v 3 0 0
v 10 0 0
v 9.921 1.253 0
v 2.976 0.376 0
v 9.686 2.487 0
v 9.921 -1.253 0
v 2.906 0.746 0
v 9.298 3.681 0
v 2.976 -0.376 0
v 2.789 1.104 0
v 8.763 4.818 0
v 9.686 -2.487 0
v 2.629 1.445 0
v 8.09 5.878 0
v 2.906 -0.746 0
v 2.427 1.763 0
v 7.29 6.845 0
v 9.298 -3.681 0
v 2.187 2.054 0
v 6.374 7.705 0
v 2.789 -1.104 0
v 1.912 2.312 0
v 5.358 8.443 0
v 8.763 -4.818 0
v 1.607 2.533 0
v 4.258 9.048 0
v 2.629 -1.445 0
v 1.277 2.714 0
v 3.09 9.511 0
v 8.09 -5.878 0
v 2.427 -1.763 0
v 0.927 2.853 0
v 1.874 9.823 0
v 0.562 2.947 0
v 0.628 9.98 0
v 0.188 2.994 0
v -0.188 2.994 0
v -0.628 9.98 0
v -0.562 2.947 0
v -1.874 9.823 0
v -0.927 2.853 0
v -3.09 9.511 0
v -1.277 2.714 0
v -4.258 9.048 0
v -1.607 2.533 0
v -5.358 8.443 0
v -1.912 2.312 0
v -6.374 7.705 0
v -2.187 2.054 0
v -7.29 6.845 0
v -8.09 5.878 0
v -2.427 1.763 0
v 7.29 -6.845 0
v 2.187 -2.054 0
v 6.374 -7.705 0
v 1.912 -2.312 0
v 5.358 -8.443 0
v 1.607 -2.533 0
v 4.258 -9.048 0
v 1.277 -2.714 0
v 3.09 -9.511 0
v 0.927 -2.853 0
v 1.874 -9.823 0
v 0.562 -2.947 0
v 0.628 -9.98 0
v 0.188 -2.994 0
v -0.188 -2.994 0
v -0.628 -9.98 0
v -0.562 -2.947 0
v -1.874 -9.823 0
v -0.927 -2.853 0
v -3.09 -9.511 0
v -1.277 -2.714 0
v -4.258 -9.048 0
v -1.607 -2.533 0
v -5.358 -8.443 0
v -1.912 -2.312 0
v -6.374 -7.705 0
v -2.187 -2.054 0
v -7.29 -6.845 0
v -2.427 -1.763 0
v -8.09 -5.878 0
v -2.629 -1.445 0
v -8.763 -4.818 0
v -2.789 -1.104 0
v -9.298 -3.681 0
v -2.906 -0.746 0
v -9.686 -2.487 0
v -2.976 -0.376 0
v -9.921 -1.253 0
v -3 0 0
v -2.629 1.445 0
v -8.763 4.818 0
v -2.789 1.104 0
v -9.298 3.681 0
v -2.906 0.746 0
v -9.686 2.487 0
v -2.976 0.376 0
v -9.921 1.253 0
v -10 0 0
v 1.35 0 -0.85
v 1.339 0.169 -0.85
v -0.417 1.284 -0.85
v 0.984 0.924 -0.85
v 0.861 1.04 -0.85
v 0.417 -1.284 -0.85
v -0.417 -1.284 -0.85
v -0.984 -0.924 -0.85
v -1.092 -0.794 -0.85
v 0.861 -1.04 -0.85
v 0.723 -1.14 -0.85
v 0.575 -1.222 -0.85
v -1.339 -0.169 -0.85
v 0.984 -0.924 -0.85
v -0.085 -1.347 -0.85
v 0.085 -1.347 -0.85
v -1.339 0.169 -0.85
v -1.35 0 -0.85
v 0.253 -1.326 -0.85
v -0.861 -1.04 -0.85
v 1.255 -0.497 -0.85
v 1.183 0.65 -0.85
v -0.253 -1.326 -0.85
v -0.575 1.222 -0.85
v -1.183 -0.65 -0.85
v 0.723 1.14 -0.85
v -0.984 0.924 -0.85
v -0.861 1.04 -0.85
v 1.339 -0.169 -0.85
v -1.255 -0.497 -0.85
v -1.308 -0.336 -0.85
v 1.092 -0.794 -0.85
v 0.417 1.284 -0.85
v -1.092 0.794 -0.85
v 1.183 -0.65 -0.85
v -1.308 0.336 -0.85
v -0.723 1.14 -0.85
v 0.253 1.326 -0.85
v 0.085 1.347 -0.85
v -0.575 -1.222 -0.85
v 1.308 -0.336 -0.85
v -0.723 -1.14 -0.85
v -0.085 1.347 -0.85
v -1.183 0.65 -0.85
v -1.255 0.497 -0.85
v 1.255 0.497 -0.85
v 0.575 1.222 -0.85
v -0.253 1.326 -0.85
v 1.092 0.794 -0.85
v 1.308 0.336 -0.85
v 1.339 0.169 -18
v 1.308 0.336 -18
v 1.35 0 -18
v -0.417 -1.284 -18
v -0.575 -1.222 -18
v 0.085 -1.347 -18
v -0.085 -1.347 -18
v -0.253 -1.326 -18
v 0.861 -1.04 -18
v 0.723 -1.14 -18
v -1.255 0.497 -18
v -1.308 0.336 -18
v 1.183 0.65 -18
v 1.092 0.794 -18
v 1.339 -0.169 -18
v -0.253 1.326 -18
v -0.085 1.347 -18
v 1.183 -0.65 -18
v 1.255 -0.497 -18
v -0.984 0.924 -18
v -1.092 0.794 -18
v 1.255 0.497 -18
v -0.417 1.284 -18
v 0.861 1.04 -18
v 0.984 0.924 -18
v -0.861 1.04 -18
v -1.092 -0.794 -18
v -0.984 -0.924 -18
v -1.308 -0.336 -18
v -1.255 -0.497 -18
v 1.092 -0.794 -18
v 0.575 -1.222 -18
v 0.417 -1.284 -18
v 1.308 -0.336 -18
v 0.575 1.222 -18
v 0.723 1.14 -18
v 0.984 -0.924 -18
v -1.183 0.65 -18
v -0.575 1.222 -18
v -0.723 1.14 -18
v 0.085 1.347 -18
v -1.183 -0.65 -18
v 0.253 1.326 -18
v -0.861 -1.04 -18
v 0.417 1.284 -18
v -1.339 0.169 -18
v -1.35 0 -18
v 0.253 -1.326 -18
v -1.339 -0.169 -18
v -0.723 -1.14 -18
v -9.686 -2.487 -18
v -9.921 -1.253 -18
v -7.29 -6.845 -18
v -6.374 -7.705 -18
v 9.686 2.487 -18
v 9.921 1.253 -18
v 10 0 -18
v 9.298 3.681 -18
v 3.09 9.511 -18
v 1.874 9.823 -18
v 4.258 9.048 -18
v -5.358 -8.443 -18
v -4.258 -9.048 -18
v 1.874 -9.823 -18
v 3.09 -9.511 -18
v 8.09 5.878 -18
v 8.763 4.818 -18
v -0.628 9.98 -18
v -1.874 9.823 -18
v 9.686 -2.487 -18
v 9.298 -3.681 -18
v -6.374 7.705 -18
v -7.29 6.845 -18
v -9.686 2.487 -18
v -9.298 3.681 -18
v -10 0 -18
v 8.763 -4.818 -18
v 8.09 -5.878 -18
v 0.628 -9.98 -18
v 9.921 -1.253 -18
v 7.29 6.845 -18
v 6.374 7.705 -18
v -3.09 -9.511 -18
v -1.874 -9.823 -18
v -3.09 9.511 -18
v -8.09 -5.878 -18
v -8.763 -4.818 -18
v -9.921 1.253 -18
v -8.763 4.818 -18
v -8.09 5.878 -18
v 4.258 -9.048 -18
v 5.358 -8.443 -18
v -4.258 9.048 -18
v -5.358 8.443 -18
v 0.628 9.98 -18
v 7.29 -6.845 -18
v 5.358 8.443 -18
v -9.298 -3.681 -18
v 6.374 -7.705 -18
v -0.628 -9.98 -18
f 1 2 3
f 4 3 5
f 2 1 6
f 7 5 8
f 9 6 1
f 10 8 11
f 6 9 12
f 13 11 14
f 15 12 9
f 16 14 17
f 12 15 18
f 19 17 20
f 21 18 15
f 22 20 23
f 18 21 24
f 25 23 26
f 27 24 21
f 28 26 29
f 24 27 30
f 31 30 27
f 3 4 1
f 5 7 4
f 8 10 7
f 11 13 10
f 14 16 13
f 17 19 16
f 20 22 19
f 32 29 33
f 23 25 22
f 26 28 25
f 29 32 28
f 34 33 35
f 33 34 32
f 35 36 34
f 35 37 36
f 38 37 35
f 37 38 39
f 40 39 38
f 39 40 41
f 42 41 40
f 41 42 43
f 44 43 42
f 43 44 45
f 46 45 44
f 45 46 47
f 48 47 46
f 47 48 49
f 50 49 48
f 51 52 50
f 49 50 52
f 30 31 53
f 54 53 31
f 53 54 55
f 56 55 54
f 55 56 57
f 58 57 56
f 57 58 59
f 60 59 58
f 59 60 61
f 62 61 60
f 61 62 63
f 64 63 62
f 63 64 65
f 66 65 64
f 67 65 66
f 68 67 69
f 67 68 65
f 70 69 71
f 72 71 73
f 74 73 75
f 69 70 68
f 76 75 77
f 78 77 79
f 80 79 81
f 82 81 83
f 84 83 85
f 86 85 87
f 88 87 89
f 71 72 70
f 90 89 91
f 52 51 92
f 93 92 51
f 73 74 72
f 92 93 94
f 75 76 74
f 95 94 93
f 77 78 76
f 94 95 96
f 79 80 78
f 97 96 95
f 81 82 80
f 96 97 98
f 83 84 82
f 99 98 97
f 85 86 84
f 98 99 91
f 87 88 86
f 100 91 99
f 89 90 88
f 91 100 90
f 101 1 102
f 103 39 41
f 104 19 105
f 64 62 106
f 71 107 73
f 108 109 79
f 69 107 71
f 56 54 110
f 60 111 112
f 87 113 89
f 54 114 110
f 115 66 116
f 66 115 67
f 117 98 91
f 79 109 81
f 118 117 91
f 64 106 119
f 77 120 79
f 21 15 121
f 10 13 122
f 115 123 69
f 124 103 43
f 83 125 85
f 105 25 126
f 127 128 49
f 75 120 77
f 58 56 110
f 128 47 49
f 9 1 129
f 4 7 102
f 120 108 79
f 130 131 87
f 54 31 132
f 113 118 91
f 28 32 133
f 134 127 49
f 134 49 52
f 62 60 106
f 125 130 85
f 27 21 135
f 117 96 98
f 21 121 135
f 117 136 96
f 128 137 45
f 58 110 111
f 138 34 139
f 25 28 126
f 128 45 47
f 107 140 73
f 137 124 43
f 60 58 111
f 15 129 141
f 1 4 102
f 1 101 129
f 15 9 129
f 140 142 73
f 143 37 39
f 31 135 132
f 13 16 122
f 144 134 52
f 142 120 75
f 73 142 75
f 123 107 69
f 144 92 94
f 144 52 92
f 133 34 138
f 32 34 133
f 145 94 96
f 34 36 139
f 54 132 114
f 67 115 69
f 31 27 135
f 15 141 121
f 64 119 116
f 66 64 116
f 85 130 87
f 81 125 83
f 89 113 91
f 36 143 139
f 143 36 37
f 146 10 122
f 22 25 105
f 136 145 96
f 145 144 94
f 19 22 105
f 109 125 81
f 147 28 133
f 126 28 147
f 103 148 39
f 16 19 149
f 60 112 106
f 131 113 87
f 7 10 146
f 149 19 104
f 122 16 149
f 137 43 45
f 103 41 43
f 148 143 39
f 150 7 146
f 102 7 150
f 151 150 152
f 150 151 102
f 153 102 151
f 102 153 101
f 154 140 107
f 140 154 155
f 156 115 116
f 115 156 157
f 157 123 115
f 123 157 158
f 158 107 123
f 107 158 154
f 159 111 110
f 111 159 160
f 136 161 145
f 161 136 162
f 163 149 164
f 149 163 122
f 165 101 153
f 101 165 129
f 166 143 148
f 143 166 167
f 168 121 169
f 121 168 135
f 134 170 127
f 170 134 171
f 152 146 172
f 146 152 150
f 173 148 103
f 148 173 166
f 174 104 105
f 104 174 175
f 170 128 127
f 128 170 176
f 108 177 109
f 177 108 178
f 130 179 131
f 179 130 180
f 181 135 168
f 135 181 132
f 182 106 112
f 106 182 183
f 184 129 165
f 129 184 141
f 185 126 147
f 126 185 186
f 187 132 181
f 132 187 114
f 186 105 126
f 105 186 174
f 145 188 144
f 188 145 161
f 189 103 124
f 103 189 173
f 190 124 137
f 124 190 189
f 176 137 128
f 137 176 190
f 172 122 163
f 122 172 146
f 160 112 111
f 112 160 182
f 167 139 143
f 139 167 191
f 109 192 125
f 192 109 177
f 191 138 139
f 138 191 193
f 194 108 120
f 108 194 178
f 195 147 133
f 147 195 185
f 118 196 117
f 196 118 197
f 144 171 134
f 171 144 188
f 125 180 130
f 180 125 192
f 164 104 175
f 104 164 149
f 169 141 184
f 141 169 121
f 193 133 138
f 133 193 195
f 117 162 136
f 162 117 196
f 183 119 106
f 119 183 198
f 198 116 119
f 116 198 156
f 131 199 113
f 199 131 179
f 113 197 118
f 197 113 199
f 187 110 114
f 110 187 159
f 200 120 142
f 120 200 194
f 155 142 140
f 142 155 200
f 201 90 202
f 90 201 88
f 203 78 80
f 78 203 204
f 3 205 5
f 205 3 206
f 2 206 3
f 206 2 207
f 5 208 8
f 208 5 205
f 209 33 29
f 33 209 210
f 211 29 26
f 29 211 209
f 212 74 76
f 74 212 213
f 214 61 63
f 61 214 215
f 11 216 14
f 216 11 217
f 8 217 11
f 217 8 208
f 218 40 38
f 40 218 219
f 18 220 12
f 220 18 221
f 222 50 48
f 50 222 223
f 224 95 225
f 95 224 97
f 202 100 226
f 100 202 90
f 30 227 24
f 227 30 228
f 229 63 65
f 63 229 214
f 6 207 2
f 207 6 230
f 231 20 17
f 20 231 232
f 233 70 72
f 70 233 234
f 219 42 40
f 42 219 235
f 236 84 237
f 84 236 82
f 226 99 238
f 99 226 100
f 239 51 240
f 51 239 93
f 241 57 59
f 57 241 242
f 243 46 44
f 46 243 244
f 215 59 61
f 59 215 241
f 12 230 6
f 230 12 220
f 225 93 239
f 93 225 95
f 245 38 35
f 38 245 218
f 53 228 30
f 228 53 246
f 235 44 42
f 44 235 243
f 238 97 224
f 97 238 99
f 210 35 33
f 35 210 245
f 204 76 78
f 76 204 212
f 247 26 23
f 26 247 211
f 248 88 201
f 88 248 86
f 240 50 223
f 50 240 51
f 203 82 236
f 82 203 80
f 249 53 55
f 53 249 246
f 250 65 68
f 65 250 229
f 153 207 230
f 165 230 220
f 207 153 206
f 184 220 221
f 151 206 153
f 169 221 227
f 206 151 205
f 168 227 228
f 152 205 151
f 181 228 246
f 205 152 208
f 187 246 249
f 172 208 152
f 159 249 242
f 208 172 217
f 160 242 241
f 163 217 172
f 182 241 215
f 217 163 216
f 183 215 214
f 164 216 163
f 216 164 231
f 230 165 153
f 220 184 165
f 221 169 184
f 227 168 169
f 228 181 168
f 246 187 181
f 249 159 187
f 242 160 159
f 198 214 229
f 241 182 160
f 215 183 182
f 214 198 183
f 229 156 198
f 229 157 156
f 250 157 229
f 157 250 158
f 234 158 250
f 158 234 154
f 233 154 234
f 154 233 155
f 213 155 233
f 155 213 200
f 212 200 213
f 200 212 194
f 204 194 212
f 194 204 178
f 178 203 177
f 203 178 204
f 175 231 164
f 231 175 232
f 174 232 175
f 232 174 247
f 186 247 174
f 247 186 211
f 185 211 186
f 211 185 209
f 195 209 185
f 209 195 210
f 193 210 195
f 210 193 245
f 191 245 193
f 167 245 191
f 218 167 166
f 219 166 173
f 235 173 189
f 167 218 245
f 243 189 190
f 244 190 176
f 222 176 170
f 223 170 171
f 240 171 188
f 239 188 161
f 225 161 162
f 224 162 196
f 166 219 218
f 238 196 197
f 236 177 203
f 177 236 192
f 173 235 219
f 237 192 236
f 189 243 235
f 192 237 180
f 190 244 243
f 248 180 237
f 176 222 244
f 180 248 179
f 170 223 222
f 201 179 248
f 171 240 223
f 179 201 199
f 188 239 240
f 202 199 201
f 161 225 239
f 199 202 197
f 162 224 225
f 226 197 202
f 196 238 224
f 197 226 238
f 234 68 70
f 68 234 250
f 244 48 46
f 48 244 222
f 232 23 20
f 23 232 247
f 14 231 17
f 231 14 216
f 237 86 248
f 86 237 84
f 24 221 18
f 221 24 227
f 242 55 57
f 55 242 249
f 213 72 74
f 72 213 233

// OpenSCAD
$fn = 50;

difference() {
	union() {
		translate(v = [0, 0, -18.0]) {
			cylinder(h = 18, r = 10.0);
		}
	}
	union() {
		translate(v = [0, 0, 0]) {
			rotate(a = [0, 0, 0]) {
				difference() {
					union() {
						translate(v = [0, 0, -21.0]) {
							cylinder(h = 21, r = 1.0);
						}
						translate(v = [0, 0, -0.85]) {
							cylinder(h = 0.85, r1 = 1.35, r2 = 3.0);
						}
						translate(v = [0, 0, -21.0]) {
							cylinder(h = 21, r = 1.35);
						}
						translate(v = [0, 0, -21.0]) {
							cylinder(h = 21, r = 1.0);
						}
					}
					union();
				}
			}
		}
	}
}
